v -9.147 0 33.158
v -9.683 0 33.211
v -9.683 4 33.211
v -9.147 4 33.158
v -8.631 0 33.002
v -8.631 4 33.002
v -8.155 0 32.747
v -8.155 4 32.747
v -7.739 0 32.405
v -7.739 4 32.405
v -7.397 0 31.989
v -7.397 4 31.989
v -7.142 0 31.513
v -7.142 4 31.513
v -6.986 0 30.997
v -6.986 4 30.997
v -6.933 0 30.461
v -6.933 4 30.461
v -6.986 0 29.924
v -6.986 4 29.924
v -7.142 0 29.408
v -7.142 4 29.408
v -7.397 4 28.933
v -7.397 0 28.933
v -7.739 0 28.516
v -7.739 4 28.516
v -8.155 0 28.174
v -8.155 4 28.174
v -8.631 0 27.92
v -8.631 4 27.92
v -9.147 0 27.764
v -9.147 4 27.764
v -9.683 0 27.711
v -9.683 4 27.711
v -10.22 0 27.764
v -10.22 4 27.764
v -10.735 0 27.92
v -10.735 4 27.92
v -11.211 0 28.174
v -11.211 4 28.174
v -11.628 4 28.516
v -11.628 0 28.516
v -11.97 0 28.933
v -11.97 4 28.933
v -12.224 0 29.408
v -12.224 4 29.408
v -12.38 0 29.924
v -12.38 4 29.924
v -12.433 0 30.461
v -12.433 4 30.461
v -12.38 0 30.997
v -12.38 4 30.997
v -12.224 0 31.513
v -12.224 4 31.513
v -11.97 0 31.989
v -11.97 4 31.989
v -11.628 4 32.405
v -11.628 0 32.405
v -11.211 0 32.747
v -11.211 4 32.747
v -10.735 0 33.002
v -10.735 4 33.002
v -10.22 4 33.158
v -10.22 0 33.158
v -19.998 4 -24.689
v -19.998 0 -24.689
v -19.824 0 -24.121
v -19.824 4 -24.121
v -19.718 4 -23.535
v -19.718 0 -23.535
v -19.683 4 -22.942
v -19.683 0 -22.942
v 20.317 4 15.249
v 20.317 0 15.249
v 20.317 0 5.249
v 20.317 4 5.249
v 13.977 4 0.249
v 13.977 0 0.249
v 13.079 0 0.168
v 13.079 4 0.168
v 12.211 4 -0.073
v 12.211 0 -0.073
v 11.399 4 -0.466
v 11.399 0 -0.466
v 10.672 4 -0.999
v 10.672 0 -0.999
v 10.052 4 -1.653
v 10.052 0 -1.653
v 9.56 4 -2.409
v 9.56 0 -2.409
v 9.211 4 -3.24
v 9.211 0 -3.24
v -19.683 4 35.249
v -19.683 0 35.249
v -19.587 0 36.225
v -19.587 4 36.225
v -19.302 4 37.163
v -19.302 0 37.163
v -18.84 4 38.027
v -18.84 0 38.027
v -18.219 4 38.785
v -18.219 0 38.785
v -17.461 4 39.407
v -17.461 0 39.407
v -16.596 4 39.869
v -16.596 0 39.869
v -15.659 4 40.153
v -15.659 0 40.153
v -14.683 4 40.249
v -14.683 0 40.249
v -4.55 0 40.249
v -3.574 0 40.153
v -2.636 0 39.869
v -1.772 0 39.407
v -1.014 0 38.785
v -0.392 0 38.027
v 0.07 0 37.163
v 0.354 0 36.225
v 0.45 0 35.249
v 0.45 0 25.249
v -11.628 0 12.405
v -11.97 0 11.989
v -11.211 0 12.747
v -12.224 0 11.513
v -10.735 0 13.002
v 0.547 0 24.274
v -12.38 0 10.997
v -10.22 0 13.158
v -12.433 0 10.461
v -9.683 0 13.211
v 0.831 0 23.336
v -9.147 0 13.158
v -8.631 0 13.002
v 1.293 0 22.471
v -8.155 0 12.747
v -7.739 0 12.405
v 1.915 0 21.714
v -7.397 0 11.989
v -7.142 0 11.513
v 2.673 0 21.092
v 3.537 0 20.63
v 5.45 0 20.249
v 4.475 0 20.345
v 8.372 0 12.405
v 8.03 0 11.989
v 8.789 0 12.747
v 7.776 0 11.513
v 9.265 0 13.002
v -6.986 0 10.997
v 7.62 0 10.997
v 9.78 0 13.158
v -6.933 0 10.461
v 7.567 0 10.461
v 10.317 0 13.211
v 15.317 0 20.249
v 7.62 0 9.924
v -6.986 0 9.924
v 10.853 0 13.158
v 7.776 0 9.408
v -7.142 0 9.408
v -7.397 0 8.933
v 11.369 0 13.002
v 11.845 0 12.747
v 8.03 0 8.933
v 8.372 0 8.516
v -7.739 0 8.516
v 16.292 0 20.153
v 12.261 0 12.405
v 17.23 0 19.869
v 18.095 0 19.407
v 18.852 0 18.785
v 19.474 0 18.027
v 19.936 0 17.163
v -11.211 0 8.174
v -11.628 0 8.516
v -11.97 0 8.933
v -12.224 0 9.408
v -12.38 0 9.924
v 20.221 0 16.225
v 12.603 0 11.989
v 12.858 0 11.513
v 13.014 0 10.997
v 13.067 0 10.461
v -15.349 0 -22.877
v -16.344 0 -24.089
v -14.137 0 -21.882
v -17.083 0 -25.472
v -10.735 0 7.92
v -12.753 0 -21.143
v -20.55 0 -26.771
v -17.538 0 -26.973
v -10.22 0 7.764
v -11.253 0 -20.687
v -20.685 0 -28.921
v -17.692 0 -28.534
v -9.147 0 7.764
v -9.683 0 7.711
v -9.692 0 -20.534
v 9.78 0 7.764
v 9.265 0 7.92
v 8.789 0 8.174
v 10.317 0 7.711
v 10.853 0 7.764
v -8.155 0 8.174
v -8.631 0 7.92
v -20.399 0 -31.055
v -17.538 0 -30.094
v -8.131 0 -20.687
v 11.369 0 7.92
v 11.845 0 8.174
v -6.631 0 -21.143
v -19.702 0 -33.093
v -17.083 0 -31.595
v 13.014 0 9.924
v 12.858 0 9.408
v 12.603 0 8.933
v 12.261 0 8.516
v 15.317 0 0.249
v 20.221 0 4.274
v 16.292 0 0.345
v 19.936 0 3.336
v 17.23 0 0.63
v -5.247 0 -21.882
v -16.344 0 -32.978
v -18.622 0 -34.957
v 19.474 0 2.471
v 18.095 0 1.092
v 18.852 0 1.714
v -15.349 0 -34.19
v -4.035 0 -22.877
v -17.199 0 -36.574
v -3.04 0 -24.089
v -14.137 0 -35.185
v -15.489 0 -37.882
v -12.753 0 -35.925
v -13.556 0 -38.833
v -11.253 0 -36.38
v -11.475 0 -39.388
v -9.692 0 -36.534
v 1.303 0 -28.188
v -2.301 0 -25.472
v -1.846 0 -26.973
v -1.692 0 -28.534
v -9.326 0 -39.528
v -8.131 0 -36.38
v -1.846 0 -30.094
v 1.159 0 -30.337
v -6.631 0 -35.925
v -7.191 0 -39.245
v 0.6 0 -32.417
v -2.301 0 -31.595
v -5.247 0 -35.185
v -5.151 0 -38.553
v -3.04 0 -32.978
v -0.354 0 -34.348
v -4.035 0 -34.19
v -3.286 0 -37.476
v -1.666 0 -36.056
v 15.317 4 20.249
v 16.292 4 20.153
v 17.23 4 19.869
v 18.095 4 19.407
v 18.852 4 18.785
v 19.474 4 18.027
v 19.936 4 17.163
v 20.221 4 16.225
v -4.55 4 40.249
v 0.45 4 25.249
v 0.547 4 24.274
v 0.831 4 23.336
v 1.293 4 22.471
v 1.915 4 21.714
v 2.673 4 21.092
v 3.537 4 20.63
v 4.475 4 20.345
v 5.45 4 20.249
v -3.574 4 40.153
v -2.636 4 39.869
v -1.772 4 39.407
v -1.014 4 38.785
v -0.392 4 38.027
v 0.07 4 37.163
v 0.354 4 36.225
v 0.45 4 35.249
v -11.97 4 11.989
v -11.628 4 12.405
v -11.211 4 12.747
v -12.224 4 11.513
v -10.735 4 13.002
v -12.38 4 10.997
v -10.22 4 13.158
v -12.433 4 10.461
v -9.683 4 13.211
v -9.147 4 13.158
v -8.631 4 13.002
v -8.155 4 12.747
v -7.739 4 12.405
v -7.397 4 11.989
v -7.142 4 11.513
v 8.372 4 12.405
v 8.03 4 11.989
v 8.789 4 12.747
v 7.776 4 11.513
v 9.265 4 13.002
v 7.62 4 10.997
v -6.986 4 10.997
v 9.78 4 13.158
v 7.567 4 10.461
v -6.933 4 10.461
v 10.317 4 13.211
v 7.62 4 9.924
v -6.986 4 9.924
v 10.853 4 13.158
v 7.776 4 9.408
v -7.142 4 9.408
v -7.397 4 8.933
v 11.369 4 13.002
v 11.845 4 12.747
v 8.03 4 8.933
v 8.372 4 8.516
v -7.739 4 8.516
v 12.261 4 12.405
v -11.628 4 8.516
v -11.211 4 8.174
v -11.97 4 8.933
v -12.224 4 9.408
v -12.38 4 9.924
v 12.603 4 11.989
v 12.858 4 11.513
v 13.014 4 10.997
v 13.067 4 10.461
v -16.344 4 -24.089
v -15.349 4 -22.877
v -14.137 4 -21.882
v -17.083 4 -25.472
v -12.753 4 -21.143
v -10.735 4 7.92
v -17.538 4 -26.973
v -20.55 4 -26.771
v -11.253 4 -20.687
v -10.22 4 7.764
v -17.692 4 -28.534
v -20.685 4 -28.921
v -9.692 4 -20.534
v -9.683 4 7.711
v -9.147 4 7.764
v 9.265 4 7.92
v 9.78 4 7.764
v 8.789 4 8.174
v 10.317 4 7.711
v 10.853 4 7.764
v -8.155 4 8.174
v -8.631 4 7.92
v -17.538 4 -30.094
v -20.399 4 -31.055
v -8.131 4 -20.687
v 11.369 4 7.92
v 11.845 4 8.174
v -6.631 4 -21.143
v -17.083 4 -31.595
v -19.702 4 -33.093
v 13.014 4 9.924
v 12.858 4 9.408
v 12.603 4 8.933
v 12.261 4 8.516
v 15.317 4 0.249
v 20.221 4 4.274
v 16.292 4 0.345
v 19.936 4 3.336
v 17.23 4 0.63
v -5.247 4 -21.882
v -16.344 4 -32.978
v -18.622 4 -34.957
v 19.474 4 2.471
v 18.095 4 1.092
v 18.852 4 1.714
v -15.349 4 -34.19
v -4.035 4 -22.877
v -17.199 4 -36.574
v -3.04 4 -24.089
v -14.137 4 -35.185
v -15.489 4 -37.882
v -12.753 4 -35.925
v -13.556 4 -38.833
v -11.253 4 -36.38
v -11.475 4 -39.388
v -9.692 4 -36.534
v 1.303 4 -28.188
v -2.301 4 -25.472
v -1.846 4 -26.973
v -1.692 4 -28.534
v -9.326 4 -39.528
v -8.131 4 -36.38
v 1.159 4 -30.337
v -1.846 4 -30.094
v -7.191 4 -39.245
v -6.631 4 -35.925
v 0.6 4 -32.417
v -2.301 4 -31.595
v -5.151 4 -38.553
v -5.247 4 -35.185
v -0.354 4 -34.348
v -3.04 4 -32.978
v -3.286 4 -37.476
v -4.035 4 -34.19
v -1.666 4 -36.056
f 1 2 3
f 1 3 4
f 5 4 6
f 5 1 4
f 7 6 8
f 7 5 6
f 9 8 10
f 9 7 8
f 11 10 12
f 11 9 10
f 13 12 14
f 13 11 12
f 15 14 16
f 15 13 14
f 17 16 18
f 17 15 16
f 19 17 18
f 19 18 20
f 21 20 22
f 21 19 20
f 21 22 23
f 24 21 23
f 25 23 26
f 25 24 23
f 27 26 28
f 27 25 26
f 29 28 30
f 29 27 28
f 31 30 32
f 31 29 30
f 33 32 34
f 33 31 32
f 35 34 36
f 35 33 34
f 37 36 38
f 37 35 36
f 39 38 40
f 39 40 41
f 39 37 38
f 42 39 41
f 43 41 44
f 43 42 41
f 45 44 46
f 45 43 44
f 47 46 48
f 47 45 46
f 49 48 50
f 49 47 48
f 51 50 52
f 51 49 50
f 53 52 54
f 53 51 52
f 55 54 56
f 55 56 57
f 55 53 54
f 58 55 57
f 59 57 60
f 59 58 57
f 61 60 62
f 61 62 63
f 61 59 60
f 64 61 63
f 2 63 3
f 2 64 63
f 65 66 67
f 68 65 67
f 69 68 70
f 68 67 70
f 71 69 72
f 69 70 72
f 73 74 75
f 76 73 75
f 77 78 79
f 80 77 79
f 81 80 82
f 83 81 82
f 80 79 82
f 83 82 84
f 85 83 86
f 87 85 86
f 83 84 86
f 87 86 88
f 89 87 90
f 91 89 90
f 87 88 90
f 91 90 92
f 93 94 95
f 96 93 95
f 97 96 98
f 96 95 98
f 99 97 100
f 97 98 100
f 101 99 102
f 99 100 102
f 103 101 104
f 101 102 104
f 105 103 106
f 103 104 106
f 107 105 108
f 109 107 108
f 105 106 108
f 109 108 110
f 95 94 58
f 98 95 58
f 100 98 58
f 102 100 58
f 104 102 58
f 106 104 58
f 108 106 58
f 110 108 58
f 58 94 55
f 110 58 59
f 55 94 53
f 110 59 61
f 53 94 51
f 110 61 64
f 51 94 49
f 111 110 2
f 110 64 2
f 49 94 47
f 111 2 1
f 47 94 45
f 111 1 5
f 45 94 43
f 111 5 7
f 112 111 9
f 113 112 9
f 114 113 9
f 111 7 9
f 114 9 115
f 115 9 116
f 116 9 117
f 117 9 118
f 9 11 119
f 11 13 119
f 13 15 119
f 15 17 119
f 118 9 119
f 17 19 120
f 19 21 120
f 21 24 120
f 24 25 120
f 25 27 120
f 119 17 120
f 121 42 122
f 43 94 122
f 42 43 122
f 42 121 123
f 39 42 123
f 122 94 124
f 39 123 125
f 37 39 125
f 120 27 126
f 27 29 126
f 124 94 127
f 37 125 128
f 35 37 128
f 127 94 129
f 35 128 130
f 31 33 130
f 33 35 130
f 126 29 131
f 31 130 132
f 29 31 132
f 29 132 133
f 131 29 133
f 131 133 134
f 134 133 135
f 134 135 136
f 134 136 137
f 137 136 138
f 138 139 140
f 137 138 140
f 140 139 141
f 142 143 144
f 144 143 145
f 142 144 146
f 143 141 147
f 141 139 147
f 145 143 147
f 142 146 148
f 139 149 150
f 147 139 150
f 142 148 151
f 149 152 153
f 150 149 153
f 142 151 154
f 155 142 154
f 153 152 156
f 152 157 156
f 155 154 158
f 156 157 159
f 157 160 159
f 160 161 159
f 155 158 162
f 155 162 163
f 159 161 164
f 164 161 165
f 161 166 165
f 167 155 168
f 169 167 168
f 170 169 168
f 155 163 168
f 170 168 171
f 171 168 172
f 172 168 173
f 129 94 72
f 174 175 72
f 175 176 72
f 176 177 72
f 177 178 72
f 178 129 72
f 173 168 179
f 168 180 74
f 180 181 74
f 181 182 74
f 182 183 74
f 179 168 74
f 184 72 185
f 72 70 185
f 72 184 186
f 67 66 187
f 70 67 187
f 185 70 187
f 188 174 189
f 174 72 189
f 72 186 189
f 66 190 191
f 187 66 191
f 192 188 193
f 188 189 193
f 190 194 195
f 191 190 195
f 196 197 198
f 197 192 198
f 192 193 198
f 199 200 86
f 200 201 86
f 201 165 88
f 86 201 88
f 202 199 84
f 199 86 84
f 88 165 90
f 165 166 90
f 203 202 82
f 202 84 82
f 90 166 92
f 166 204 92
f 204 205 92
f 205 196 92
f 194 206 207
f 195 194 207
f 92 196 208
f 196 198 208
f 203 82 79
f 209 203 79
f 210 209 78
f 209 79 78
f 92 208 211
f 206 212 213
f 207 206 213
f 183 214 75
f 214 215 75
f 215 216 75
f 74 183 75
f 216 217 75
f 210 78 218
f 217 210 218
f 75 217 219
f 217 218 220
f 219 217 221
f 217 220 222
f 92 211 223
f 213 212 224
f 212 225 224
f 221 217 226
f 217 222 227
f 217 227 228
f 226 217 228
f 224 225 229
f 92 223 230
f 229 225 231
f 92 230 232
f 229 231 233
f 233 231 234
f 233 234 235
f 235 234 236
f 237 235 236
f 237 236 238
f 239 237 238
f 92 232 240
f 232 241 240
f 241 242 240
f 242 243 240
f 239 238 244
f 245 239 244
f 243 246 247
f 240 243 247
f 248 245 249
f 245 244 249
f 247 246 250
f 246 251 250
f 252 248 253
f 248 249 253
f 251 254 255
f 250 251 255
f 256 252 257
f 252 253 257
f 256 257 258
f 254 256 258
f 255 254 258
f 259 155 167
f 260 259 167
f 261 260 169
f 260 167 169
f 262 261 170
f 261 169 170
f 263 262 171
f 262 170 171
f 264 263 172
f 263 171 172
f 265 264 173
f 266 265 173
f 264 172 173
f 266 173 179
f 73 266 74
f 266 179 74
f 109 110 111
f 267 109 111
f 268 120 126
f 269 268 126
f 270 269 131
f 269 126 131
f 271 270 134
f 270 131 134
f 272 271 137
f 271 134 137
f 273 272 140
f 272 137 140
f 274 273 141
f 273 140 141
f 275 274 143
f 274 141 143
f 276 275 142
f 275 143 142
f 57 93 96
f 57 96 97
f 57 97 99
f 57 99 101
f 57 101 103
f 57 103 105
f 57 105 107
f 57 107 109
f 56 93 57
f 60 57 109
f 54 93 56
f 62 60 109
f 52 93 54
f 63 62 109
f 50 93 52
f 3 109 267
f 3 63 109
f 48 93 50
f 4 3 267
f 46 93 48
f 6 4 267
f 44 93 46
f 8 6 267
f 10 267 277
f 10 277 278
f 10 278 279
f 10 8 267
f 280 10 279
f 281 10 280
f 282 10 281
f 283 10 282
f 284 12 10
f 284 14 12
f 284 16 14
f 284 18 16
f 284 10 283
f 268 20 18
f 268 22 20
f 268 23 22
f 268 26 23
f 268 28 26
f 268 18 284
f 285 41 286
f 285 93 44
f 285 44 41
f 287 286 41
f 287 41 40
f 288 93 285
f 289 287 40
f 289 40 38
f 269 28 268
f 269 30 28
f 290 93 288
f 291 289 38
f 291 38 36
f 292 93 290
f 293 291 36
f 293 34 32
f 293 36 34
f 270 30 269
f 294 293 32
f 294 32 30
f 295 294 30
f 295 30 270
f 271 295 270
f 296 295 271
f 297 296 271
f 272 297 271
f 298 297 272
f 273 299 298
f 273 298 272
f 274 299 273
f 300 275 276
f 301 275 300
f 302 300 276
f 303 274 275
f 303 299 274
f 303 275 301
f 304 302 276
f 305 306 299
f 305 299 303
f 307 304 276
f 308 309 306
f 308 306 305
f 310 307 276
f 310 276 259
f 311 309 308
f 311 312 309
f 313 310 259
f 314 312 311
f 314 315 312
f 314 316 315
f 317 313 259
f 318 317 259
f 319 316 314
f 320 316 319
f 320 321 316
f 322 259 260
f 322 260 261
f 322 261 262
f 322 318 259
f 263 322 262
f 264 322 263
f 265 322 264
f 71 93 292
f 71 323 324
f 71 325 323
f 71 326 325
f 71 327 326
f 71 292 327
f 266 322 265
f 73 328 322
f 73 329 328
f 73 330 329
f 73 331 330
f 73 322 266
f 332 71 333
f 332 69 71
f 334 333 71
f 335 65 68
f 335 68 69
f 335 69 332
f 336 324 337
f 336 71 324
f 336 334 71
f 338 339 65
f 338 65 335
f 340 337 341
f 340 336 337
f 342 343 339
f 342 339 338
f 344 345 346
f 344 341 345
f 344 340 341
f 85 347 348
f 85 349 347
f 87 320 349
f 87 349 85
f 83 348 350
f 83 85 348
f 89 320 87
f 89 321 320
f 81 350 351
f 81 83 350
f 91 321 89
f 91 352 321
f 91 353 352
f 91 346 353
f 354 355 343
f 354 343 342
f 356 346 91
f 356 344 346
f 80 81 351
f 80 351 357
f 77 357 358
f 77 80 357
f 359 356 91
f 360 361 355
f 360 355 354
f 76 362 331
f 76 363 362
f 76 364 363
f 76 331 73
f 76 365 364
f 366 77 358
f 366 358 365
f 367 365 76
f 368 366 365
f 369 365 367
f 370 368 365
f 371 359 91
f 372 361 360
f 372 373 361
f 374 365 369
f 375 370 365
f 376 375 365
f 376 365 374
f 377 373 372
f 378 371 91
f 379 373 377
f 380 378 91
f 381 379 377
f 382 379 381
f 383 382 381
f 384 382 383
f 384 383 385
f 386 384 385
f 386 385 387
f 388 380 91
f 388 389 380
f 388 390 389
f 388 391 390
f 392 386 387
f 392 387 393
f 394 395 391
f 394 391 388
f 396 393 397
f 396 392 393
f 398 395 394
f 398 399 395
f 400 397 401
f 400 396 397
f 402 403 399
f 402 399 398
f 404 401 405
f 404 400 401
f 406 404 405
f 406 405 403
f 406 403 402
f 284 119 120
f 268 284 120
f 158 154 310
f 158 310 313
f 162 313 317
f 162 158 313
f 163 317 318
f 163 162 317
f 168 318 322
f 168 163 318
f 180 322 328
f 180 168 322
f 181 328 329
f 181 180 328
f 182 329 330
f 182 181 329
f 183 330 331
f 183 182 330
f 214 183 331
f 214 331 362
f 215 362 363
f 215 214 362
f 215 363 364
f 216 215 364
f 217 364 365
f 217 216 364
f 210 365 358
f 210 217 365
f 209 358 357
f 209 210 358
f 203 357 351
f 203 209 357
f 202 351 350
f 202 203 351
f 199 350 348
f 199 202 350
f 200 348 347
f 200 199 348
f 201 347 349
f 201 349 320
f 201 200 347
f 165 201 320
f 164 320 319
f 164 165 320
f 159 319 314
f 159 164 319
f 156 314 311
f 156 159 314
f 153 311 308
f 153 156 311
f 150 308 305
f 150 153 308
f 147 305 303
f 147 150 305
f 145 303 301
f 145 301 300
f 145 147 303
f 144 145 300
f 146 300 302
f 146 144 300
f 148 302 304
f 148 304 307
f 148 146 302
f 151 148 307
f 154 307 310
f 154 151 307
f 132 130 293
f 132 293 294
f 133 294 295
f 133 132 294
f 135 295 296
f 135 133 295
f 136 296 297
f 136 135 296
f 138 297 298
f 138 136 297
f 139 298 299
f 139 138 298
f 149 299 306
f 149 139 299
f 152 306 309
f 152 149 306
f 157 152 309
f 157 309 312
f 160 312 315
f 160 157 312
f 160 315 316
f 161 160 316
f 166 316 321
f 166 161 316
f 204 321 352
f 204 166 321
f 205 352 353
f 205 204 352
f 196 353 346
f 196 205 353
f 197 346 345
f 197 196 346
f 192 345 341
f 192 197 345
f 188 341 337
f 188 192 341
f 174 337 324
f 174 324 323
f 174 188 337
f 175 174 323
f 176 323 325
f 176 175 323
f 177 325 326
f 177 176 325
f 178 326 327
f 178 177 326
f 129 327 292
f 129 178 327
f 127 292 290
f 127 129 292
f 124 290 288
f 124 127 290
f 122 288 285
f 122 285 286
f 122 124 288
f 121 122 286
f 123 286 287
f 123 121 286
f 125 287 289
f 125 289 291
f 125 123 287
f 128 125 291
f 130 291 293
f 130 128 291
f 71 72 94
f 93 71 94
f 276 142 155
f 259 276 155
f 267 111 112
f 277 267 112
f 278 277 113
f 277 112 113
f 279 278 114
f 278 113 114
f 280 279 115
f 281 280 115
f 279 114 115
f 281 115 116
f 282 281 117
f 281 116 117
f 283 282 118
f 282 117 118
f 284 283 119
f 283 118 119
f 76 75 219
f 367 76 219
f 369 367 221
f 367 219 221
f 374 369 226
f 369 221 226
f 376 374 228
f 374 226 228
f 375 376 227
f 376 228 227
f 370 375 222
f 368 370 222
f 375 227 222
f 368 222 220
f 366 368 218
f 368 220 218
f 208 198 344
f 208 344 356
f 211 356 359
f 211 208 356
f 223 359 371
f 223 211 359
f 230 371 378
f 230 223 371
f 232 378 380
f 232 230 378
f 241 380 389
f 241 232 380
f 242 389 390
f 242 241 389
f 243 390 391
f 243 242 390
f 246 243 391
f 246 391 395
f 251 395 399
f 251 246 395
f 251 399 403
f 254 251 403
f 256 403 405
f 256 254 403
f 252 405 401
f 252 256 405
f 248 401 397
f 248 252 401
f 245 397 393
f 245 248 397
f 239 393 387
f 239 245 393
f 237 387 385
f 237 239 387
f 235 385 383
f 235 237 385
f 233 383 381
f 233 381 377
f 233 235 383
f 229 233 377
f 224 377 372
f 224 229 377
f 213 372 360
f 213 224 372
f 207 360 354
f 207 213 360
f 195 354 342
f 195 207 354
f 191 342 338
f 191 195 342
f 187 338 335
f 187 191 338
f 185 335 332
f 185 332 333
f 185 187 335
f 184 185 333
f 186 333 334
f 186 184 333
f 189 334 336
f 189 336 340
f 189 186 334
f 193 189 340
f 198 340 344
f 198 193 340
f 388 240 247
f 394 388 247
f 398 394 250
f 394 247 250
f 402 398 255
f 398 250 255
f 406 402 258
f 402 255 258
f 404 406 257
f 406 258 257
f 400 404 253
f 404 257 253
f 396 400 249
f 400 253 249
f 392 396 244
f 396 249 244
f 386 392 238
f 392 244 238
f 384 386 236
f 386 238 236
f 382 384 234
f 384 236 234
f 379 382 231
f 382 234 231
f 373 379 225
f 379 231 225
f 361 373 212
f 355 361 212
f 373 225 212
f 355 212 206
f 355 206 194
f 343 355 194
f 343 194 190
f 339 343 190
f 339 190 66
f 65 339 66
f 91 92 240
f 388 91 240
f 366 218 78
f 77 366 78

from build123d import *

# Parameters (mm, degrees)
CROQUIS1_R              = 2.75
CROQUIS1_R_2            = 8
SALIENTE_EXTRUIR1_DEPTH = 4


with BuildPart() as part:
    # Croquis1 → Saliente-Extruir1 (new body)
    with BuildSketch(Plane(origin=(0, 0, 0), x_dir=(1, 0, 0), z_dir=(0, 1, 0))):
        with BuildLine():
            Line((-19.683050508, 22.941797025), (-19.683050508, -35.249327106))
            ThreePointArc((-19.683050508, -35.249327106), (-18.218584414, -38.784861012), (-14.683050508, -40.249327106))
            Line((-14.683050508, -40.249327106), (-4.549566926, -40.249327106))
            ThreePointArc((-4.549566926, -40.249327106), (-1.01403302, -38.784861012), (0.450433074, -35.249327106))
            Line((0.450433074, -35.249327106), (0.450433074, -25.249327106))
            ThreePointArc((0.450433074, -25.249327106), (1.914899168, -21.7137932), (5.450433074, -20.249327106))
            Line((5.450433074, -20.249327106), (15.316949492, -20.249327106))
            ThreePointArc((15.316949492, -20.249327106), (18.852483398, -18.784861012), (20.316949492, -15.249327106))
            Line((20.316949492, -15.249327106), (20.316949492, -5.249327106))
            ThreePointArc((20.316949492, -5.249327106), (18.852483398, -1.7137932), (15.316949492, -0.249327106))
            Line((15.316949492, -0.249327106), (13.97720353, -0.249327106))
            ThreePointArc((13.97720353, -0.249327106), (11.023751057, 0.716181787), (9.210932436, 3.239825498))
            Line((9.210932436, 3.239825498), (1.302567045, 28.188350052))
            ThreePointArc((1.302567045, 28.188350052), (-11.475083798, 39.388167744), (-19.998351013, 24.689249641))
            ThreePointArc((-19.998351013, 24.689249641), (-19.762506967, 23.82963218), (-19.683050508, 22.941797025))
        make_face()
        with Locations(Location((10.316949492, -10.460860181, 0), (0, 0, 270))):
            Circle(CROQUIS1_R, mode=Mode.SUBTRACT)
        with Locations(Location((-9.683050508, -10.460860181, 0), (0, 0, 270))):
            Circle(CROQUIS1_R, mode=Mode.SUBTRACT)
        with Locations(Location((-9.683050508, -30.460860181, 0), (0, 0, 270))):
            Circle(CROQUIS1_R, mode=Mode.SUBTRACT)
        with Locations(Location((-9.692012125, 28.533645396, 0), (0, 0, 270))):
            Circle(CROQUIS1_R_2, mode=Mode.SUBTRACT)
    extrude(amount=SALIENTE_EXTRUIR1_DEPTH)


solid = part.part
